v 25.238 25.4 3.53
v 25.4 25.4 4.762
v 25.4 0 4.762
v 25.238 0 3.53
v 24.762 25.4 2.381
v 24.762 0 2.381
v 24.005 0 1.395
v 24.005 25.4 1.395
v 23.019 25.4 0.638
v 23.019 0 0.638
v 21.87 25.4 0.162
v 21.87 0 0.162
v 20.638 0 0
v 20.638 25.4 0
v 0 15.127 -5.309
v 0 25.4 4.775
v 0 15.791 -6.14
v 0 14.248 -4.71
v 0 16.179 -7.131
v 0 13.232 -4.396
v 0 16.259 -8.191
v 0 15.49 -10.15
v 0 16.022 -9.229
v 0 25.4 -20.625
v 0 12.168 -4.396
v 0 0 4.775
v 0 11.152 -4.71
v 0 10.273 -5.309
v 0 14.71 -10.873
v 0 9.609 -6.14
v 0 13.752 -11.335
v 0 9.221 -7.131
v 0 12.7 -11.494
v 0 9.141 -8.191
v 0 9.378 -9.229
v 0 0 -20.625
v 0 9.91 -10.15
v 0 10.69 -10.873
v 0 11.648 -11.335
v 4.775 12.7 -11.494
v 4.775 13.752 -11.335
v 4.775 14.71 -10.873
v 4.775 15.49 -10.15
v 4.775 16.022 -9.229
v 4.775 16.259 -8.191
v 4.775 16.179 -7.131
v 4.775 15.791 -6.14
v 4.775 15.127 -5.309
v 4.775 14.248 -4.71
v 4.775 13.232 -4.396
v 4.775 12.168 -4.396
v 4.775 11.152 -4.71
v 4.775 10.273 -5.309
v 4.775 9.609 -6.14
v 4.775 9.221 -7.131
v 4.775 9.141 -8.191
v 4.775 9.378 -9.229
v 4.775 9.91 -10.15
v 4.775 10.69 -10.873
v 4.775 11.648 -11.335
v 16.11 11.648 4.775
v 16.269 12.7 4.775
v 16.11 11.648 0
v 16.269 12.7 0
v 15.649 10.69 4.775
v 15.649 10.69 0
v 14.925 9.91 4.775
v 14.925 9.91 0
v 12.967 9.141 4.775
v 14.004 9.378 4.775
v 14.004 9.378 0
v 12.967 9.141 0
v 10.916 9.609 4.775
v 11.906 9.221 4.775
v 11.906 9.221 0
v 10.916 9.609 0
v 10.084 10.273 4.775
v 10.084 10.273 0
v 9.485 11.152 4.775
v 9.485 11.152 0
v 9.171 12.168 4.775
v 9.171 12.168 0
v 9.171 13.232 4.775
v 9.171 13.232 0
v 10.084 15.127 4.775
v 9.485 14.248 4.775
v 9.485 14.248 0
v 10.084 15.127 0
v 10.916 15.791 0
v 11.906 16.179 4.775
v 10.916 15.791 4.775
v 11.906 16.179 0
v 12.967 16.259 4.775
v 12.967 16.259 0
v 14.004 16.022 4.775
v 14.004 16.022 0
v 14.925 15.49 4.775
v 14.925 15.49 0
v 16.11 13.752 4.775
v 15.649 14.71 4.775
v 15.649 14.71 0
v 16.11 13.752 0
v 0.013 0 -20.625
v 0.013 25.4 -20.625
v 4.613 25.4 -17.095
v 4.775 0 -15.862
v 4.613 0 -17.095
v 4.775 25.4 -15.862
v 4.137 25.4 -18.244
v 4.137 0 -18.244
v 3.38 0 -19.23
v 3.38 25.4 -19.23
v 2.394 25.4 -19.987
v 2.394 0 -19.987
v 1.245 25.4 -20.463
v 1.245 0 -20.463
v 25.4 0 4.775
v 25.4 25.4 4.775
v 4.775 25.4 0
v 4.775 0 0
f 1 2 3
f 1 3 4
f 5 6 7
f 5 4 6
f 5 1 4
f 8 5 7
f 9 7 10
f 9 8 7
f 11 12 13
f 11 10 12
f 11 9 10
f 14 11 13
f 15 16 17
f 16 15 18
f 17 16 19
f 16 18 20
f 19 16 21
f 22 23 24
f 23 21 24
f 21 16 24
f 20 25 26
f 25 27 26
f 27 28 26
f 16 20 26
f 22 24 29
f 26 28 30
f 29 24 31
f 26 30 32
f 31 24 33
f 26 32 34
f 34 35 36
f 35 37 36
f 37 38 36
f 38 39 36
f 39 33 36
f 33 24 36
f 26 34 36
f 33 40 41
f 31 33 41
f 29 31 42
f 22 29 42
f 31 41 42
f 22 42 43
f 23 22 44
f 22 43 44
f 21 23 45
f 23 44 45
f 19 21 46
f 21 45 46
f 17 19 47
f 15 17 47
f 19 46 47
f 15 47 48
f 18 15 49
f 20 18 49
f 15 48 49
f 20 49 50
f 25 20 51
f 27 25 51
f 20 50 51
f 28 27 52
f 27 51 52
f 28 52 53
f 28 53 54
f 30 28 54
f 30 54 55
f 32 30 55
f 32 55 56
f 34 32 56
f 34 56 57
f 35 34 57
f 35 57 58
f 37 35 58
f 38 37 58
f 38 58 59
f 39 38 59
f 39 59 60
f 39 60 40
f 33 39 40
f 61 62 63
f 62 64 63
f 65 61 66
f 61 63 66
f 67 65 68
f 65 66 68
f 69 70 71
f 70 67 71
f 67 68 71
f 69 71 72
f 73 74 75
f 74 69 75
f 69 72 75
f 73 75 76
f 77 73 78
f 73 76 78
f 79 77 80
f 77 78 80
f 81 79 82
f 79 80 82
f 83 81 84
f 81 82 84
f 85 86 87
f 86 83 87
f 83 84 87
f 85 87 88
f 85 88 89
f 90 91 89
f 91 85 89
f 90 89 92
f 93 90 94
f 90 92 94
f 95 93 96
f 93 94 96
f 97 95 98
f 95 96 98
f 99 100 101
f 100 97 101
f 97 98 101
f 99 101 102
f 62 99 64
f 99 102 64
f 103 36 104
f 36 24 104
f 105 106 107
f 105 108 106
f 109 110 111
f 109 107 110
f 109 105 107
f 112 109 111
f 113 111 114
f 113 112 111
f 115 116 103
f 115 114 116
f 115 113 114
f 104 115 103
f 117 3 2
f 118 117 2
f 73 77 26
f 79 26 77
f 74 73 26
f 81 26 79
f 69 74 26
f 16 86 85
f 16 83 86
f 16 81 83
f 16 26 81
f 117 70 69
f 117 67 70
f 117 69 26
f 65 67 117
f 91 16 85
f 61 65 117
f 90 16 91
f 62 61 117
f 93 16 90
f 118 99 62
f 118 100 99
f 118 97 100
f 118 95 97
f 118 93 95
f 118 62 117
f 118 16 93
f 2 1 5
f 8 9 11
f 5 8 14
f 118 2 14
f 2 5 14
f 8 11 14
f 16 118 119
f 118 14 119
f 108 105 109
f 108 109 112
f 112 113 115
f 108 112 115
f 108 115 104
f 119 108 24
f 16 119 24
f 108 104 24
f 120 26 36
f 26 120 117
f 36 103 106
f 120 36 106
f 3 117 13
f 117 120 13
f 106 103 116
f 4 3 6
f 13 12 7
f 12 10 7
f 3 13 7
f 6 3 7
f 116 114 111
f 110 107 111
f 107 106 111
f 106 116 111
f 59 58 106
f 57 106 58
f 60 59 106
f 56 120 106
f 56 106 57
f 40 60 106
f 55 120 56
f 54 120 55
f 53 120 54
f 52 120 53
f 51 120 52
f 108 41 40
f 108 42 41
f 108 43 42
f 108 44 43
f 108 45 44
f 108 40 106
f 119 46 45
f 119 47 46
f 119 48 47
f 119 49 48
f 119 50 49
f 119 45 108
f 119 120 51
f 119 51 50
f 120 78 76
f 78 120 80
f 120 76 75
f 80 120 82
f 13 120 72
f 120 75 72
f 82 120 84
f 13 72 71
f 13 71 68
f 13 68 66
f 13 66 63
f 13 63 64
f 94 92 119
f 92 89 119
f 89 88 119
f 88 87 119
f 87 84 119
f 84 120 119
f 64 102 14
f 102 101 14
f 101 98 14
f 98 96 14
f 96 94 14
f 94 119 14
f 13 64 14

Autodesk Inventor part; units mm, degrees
ref_plane "YZ Plane" through (0, 0, 0) normal (1, 0, 0) x (0, 1, 0)
ref_plane "XZ Plane" through (0, 0, 0) normal (0, 1, 0) x (-1, 0, 0)
ref_plane "XY Plane" through (0, 0, 0) normal (0, 0, 1) x (1, 0, 0)
sketch "Sketch1" plane through (0, 0, 0) normal (0, 0, 1) x (1, 0, 0)
  line L0 (0, 0) -> (25.4, 0)
  line L1 (25.4, 0) -> (25.4, 25.4)
  line L2 (25.4, 25.4) -> (0, 25.4)
  line L3 (0, 25.4) -> (0, 0)
  circle A0 centre (12.7, 12.7) radius 3.5687
  dimension "d0" = 25.4
  dimension "d1" = 25.4
  dimension "d2" = 7.1374
extrude "Extrusion1" add sketch "Sketch1" along normal blind 4.7752
sketch "Sketch2" plane through (0, 0, 4.7752) normal (0, 0, 1) x (1, 0, 0)
  line L0 (25.4, 25.4) -> (0, 25.4) projected
  line L1 (0, 0) -> (4.7752, 0)
  line L2 (4.7752, 0) -> (4.7752, 25.4)
  line L3 (4.7752, 25.4) -> (0, 25.4)
  line L4 (0, 25.4) -> (0, 0)
  dimension "d5" = 4.7752
extrude "Extrusion2" add sketch "Sketch2" against normal blind 25.4
sketch "Sketch3" plane through (4.7752, 0, 0) normal (1, 0, 0) x (0, 0, -1)
  line L0 (20.6248, 25.4) -> (20.6248, 0) projected
  circle A0 centre (7.9248, 12.7) radius 3.5687
  point P0 (0, 0)
  dimension "d9" = 7.1374
extrude "Extrusion3" cut sketch "Sketch3" against normal up to next
fillet "Fillet1" radius 4.7625 1 edges at (4.7752, 12.7, -20.6248)
fillet "Fillet2" radius 4.7625 1 edges at (25.4, 12.7, 0)
properties part number "8020_CornerBracket"
